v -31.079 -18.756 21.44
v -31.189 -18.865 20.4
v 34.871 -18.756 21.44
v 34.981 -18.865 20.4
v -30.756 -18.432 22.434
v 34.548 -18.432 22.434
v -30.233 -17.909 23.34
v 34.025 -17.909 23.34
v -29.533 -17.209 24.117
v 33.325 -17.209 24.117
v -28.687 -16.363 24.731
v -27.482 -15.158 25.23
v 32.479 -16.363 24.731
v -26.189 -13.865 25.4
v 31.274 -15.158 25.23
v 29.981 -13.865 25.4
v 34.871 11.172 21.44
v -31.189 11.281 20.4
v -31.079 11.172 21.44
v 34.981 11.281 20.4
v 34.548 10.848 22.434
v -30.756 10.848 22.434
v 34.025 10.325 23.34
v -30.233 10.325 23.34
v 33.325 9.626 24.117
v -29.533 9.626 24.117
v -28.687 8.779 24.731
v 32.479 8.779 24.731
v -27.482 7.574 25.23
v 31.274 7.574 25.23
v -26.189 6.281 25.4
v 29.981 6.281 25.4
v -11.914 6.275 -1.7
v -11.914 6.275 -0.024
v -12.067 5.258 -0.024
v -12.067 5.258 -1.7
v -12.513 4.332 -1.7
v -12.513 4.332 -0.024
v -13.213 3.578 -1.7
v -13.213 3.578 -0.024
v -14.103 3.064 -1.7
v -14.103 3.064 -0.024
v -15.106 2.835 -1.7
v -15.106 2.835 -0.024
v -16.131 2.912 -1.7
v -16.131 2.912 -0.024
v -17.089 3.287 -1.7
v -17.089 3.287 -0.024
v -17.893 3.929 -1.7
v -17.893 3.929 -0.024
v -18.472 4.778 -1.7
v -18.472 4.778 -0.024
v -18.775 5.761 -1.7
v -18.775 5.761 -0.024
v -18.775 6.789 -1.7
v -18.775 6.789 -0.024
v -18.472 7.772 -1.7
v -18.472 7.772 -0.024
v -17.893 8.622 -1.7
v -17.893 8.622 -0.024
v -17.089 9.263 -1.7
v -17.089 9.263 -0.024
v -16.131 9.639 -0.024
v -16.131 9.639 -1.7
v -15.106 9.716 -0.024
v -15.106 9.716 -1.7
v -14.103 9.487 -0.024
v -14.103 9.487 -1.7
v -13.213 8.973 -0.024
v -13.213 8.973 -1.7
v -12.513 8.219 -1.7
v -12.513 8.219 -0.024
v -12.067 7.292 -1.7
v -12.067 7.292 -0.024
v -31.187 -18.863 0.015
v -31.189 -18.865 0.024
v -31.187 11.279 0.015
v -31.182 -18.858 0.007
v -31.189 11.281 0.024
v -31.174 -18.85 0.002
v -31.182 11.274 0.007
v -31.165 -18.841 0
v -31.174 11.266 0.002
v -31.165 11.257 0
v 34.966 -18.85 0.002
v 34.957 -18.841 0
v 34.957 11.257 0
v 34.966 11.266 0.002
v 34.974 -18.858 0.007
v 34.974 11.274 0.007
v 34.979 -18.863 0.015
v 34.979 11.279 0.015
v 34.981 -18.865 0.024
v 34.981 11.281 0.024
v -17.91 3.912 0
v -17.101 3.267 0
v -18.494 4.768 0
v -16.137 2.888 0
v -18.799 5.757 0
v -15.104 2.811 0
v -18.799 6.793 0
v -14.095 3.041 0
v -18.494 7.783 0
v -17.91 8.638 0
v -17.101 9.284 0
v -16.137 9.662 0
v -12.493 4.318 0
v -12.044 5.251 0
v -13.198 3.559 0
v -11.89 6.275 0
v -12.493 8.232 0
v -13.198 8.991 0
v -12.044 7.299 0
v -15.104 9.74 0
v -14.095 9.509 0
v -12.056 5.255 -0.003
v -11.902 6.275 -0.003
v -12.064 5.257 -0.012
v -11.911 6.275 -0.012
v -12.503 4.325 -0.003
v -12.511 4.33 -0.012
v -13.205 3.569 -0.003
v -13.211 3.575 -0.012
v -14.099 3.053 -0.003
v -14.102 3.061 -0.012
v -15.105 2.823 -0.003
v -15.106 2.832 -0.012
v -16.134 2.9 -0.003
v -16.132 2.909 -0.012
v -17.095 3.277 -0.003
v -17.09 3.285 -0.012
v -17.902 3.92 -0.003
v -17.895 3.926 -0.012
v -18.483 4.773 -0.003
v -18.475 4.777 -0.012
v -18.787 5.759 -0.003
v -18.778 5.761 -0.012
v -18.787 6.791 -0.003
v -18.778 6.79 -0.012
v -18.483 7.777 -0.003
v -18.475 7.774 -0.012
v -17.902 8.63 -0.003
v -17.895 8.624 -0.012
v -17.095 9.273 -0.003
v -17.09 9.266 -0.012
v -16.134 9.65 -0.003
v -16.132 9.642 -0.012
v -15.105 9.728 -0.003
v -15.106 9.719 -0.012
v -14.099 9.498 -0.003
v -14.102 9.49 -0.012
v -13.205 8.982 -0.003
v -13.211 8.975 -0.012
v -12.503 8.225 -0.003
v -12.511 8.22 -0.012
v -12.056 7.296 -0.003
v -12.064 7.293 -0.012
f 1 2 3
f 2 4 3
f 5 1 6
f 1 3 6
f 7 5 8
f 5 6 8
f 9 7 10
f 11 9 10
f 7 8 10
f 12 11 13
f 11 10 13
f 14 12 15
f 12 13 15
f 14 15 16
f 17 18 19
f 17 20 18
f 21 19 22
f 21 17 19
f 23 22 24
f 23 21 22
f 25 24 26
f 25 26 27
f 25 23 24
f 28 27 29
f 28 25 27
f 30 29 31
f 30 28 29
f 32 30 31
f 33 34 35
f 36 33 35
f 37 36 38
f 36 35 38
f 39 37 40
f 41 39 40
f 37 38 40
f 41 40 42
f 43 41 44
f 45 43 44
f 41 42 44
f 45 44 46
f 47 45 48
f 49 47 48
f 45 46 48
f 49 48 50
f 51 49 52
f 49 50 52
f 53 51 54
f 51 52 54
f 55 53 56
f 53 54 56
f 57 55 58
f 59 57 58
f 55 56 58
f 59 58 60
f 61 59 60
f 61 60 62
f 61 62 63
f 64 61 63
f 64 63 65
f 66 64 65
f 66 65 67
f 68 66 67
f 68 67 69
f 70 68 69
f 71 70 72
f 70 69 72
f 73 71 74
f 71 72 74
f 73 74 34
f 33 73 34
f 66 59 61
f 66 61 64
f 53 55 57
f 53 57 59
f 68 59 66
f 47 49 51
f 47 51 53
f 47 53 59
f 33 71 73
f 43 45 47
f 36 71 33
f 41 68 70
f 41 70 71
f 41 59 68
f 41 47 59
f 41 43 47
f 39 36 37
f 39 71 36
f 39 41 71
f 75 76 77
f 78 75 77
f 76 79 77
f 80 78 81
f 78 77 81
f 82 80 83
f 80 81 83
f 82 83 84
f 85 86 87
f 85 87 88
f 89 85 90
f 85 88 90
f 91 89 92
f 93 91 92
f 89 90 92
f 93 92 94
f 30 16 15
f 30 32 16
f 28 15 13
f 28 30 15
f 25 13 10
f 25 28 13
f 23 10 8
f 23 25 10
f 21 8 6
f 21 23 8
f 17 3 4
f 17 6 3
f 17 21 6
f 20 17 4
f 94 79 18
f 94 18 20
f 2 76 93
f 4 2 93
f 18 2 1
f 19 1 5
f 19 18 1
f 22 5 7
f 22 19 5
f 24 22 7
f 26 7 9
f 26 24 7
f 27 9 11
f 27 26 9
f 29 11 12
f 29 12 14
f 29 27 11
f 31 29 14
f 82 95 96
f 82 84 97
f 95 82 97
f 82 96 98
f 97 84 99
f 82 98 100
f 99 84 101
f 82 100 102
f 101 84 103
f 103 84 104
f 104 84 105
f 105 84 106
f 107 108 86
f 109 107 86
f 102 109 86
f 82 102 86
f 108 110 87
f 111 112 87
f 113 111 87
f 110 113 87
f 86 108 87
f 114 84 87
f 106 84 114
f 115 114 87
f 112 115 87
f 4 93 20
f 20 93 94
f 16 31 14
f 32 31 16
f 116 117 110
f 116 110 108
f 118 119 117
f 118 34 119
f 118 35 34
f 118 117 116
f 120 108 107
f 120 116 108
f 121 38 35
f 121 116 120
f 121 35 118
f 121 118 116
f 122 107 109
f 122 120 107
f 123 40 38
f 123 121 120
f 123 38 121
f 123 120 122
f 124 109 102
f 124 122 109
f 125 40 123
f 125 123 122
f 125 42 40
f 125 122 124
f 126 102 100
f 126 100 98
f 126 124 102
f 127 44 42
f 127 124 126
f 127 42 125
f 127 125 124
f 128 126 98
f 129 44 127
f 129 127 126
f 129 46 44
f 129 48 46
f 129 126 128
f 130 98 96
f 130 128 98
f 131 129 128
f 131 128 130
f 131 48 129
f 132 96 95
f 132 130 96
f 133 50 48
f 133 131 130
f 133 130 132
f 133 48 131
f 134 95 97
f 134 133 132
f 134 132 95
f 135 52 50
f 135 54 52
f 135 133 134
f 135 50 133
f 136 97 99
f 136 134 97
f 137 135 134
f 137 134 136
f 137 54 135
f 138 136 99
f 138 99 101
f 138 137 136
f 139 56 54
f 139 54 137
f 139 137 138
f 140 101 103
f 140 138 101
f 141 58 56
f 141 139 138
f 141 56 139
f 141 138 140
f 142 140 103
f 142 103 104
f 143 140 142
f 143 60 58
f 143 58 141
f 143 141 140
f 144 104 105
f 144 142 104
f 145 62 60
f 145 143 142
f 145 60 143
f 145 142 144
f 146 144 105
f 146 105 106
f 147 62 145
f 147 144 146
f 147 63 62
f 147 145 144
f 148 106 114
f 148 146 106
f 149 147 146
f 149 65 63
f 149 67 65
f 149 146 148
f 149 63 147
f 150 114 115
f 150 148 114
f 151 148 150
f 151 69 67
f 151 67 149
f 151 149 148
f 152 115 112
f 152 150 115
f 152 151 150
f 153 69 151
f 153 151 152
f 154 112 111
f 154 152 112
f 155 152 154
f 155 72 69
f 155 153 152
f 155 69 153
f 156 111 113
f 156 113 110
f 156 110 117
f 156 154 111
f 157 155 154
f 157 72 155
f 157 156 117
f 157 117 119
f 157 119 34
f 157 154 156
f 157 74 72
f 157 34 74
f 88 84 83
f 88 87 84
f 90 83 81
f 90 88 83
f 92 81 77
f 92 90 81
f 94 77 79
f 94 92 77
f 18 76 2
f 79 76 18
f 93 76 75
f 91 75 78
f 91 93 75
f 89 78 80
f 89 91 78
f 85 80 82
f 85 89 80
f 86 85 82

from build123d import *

# Parameters (mm, degrees)
F0_W     = 66.169410944
F0_H     = 30.1459496841
F1_DEPTH = 25.4
F6_R     = 3.4499508962
F7_DEPTH = 1.7
F8_R     = 5
F9_R     = 0.0241421356


# Not quite as in the source:
# - the program builds the solid bodies; features that only make, move or delete a surface that nothing else refers to are left out


with BuildPart() as f1:
    # F0 (on Top) → F1 (new body)
    with BuildSketch(Plane.XY):
        with Locations((1.8959715962, -3.7919436581)):
            Rectangle(F0_W, F0_H)
    extrude(amount=F1_DEPTH)

    # F6 (on face) → F7 (join)
    with BuildSketch(Plane(origin=(0, 0, 0), x_dir=(1, 0, 0), z_dir=(0, 0, -1))):
        with Locations((-15.3637295589, -6.2752226368)):
            Circle(F6_R)
    extrude(amount=F7_DEPTH)

    # F8
    f8_edges = [f1.edges().sort_by_distance(p)[0] for p in [
        (1.895972, 11.281031, 25.4),
        (-31.188734, -3.791944, 25.4),
        (1.895972, -18.864919, 25.4),
        (34.980677, -3.791944, 25.4),
    ]]
    fillet(f8_edges, radius=F8_R)

    # F9
    f9_edges = [f1.edges().sort_by_distance(p)[0] for p in [
        (1.895972, 11.281031, 0),
        (34.980677, -3.791944, 0),
        (-31.188734, -3.791944, 0),
        (1.895972, -18.864919, 0),
        (-18.81368, 6.275223, 0),
    ]]
    fillet(f9_edges, radius=F9_R)


solid = f1.part
